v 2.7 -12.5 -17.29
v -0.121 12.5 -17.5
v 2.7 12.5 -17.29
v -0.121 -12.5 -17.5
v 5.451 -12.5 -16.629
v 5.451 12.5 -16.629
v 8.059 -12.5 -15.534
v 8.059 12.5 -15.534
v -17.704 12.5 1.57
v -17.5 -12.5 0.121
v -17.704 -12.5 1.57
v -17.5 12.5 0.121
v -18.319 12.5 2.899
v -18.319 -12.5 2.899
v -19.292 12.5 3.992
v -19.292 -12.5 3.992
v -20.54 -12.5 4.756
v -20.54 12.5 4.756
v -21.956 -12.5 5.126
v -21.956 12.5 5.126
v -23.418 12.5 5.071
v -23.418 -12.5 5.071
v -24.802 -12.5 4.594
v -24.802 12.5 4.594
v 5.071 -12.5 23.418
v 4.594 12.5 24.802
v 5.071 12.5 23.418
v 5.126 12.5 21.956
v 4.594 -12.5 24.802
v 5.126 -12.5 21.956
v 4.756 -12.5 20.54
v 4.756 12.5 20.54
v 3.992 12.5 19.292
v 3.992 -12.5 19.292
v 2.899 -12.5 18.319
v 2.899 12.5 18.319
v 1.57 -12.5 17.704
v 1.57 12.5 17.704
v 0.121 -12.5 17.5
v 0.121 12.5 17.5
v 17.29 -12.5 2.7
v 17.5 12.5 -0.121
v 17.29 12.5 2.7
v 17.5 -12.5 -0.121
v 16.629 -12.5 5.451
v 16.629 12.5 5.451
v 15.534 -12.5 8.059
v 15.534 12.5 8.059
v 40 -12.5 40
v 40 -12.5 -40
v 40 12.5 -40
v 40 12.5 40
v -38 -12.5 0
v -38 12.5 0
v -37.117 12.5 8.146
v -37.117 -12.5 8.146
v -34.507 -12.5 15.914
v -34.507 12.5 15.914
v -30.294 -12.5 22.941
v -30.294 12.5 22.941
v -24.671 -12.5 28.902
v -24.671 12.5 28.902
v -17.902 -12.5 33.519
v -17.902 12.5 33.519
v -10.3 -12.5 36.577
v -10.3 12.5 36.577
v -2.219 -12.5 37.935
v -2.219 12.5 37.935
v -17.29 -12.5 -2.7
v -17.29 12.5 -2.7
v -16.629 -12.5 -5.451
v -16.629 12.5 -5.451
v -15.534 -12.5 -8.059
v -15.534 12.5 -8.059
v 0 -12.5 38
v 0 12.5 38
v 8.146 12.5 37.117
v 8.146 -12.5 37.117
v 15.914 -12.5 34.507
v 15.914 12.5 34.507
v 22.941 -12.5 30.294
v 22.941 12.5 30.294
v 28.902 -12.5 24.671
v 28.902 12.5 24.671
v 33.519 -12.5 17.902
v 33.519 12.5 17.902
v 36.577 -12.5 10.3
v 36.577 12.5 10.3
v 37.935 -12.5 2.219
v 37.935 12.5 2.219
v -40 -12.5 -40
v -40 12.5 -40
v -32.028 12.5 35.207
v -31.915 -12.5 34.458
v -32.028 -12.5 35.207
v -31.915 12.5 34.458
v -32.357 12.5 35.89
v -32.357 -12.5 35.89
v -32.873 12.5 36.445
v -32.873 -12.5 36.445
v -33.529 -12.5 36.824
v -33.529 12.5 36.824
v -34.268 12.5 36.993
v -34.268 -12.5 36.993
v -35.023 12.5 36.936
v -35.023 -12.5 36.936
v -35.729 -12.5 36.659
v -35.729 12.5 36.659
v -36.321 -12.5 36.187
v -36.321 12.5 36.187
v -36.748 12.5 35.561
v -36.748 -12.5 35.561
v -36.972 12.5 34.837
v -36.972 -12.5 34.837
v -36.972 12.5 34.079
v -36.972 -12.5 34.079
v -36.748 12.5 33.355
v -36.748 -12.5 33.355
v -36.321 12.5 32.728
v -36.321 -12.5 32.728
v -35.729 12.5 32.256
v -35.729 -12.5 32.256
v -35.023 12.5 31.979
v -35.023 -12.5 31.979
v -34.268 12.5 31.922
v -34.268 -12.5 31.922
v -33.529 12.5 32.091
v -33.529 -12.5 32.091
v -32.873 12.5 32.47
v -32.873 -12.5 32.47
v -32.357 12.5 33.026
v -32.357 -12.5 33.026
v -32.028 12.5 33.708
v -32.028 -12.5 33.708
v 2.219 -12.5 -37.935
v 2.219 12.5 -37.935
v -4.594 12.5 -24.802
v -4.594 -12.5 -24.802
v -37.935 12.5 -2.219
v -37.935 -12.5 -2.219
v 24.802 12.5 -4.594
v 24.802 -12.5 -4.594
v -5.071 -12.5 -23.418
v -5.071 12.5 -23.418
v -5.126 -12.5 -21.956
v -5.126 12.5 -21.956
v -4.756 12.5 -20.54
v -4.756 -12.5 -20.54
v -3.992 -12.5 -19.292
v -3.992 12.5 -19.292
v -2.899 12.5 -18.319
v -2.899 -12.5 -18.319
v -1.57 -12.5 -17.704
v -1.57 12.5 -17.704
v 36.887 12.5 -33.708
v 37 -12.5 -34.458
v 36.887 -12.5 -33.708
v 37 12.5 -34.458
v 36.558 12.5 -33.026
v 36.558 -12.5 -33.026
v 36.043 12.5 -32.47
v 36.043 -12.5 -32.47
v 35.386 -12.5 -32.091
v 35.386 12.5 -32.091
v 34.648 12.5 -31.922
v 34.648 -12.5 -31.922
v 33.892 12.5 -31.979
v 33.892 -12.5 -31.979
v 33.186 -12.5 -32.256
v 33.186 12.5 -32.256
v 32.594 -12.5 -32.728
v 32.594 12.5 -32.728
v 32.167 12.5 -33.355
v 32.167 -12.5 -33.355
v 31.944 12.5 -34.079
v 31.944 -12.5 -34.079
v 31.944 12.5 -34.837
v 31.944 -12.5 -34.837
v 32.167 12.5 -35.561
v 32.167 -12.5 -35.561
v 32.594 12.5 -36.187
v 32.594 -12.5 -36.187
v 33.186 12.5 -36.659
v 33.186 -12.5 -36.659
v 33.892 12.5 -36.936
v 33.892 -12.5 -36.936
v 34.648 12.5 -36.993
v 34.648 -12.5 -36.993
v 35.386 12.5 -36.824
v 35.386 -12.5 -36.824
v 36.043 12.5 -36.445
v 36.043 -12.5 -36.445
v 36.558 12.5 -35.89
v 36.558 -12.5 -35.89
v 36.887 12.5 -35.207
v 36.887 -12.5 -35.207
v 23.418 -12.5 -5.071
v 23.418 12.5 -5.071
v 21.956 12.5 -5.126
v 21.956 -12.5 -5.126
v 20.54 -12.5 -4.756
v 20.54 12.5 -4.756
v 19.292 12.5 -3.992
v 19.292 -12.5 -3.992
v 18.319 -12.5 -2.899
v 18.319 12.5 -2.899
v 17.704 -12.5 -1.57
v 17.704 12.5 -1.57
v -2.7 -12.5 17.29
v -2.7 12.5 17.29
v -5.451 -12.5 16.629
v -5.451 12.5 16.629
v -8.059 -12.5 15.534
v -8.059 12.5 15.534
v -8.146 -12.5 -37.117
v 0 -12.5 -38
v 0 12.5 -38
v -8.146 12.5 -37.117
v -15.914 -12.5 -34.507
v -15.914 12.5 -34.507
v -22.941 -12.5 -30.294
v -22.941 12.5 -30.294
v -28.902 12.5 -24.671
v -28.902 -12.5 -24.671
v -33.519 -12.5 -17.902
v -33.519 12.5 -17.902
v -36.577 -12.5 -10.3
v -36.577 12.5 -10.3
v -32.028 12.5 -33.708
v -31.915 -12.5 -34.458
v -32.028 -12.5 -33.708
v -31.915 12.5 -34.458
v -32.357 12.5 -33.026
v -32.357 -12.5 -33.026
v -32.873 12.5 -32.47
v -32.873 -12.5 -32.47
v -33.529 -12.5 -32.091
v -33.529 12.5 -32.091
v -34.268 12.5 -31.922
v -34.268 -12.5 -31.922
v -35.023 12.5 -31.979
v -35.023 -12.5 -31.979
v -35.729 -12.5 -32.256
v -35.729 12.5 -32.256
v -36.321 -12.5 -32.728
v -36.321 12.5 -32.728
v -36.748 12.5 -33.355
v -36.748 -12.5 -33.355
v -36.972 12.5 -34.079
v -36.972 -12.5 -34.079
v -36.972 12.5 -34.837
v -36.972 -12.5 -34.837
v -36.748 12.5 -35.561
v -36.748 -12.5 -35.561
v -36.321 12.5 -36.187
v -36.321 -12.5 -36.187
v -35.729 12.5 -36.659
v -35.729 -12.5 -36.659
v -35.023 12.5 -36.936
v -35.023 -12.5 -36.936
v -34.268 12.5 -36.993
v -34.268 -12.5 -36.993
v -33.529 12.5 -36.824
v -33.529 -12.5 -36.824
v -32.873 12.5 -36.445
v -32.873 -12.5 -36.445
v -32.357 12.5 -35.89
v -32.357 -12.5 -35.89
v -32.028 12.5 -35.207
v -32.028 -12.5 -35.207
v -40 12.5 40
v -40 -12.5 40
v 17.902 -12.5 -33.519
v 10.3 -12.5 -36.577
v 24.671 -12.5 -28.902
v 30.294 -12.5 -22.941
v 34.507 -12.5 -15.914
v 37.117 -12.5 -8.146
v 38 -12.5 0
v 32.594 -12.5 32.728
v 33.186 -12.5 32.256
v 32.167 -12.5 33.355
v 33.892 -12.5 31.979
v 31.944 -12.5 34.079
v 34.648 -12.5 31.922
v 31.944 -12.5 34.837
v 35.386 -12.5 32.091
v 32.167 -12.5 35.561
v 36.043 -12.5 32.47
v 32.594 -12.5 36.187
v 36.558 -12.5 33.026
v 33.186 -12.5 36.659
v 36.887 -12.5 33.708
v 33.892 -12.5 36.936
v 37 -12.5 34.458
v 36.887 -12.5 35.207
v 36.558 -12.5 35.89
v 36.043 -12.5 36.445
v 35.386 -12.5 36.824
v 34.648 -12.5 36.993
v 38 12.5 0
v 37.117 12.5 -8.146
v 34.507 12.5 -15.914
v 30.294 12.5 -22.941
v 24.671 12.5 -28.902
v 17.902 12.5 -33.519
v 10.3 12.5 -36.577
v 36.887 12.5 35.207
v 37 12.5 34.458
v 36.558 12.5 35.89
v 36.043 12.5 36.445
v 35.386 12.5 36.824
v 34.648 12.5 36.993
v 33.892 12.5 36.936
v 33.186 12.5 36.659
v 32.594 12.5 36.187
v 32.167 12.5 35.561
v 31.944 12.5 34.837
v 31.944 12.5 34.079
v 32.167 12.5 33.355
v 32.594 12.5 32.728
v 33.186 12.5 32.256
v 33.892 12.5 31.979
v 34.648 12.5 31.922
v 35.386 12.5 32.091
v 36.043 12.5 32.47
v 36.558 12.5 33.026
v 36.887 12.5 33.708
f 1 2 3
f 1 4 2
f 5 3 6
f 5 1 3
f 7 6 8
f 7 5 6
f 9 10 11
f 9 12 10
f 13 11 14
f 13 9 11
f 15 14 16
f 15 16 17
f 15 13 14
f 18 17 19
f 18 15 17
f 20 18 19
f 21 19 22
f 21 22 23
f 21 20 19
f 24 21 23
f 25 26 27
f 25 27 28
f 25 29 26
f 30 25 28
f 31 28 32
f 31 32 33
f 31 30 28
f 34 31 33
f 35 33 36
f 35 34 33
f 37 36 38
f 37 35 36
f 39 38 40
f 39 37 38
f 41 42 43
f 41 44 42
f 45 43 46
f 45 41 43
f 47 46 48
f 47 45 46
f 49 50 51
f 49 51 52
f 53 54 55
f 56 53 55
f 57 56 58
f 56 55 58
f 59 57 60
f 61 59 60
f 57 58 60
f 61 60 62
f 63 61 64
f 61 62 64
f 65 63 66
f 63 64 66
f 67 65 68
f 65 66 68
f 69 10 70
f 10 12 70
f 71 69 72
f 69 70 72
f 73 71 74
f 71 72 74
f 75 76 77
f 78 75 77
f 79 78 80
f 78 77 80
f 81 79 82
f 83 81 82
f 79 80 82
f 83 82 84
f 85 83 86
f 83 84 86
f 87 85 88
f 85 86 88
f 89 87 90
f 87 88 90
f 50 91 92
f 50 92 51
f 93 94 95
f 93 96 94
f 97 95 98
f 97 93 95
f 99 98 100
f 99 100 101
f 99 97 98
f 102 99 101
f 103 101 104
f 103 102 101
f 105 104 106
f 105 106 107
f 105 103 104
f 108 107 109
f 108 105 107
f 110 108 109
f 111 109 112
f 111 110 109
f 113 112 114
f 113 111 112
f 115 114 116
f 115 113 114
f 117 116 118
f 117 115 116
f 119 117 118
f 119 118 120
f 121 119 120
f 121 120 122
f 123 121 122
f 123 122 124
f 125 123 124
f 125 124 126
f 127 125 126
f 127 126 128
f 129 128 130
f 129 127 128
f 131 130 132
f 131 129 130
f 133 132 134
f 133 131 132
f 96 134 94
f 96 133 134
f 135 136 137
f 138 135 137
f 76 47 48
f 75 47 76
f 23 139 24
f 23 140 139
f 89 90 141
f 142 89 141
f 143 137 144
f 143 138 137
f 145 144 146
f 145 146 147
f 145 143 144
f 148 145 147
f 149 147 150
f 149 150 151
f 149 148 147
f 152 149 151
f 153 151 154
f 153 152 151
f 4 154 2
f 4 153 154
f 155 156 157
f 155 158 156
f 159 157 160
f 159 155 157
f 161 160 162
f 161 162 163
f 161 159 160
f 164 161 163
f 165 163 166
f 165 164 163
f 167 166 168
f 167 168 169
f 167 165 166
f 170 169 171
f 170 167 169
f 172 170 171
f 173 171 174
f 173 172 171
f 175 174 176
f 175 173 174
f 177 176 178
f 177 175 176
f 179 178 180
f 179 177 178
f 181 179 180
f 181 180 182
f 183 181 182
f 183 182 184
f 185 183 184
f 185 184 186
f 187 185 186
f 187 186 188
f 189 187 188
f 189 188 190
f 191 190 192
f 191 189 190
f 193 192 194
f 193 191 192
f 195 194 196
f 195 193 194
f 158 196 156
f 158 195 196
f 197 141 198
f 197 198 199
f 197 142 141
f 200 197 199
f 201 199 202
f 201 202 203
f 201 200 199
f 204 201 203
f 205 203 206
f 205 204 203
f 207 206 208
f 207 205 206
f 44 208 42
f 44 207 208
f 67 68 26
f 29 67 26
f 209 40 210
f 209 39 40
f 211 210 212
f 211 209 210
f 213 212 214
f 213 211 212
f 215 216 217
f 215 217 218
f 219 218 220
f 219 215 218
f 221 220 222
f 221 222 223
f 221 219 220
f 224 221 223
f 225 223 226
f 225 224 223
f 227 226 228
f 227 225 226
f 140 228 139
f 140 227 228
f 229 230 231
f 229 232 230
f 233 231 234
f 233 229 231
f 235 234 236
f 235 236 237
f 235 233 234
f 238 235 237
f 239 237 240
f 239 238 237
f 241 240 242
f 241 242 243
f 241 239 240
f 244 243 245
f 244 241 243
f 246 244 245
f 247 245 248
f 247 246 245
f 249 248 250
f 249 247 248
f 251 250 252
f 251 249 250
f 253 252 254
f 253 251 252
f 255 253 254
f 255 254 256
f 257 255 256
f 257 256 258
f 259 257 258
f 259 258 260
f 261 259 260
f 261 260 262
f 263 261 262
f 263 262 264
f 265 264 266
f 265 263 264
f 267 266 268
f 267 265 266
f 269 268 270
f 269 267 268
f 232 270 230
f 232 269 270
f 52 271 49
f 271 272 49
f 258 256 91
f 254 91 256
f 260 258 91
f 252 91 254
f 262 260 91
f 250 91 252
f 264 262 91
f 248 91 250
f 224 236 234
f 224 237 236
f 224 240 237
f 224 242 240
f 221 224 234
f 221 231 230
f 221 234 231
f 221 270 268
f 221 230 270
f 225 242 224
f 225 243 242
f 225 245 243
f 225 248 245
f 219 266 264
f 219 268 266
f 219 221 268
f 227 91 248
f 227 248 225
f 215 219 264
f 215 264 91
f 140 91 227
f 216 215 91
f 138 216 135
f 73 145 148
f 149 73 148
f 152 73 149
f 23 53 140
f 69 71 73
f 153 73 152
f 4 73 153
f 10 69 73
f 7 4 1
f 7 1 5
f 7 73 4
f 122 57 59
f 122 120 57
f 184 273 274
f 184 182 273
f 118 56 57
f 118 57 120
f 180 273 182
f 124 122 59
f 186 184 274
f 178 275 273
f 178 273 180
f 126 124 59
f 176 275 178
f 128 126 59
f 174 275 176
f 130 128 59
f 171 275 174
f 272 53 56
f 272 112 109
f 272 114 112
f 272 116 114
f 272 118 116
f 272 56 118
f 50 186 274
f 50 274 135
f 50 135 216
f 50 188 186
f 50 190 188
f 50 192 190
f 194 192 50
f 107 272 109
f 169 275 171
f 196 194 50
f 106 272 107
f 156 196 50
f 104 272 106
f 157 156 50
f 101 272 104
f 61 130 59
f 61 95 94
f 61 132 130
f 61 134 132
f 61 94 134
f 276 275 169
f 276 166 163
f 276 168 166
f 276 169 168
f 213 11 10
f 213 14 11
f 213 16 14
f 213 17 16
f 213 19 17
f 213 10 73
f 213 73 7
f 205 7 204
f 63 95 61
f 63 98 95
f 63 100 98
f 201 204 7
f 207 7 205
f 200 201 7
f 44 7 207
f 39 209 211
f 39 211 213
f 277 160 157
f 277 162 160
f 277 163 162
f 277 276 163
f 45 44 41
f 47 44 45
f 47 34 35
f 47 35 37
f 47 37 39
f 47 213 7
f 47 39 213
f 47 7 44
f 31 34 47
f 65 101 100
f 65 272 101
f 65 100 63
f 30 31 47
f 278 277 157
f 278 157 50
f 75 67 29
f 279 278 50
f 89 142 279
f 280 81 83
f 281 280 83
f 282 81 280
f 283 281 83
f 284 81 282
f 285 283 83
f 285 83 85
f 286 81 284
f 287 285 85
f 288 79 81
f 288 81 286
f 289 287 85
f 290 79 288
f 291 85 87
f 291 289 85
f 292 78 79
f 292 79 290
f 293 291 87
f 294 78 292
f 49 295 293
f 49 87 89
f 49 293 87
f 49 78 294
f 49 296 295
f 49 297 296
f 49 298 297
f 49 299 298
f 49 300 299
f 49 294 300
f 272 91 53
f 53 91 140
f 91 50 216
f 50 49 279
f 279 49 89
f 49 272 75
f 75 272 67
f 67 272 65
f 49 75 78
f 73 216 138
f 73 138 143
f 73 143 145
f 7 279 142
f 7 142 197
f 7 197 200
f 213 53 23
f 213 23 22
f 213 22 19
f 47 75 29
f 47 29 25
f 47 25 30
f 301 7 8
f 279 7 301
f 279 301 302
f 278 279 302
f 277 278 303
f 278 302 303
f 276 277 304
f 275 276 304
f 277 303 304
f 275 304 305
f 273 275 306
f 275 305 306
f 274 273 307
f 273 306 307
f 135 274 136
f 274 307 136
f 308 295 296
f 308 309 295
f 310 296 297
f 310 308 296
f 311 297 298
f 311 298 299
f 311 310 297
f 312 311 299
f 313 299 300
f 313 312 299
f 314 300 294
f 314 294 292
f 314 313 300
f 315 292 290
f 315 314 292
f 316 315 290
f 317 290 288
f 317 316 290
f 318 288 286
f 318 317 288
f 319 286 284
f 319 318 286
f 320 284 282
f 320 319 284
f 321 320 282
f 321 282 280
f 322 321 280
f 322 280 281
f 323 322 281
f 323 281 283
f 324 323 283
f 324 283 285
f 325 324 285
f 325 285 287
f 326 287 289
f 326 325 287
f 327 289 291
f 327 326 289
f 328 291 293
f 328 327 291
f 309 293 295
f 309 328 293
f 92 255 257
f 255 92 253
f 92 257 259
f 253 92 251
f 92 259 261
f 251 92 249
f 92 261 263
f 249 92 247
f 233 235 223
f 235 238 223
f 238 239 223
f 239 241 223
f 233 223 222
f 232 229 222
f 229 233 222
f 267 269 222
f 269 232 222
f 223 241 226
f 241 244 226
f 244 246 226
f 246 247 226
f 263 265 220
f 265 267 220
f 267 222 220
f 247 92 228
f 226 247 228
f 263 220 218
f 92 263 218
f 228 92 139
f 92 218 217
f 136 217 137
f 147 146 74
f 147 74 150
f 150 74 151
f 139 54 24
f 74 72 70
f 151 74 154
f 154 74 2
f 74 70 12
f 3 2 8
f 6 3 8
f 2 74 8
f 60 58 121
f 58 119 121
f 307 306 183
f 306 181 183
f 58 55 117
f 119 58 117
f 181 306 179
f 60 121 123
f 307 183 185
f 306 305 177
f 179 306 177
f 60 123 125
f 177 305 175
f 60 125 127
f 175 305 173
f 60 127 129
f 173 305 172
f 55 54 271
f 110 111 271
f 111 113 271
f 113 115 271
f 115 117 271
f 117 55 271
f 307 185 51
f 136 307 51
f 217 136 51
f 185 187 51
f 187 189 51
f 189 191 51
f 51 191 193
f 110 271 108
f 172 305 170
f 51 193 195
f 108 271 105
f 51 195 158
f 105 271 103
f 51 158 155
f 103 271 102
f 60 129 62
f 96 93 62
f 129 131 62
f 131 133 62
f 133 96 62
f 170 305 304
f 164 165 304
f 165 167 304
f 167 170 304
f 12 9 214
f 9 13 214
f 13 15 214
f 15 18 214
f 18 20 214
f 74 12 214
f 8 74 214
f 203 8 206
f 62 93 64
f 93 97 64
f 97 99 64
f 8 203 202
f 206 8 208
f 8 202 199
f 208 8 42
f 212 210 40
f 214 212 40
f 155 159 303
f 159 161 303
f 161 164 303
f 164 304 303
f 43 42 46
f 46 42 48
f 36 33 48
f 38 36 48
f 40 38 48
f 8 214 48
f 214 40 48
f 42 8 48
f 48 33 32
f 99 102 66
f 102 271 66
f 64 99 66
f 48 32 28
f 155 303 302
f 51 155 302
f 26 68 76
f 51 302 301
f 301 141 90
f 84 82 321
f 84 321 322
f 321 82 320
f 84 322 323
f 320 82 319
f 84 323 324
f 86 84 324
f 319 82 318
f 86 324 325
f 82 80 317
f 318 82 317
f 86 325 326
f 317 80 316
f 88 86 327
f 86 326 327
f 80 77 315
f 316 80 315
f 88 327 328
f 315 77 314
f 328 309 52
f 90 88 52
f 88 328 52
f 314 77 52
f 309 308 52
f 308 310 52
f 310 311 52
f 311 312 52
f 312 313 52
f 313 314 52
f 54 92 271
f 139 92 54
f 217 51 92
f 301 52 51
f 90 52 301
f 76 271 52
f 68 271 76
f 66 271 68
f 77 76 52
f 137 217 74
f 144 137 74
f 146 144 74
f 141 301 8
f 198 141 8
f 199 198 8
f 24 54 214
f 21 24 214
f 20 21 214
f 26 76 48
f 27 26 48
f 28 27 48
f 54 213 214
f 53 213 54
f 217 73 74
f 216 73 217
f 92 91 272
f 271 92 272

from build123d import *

# Parameters (mm, degrees)
F0_W     = 80
F0_H     = 80
F0_R     = 2.5423391552
F1_DEPTH = 12.5
F2_R     = 5


with BuildPart() as f1:
    # F0 (on Front) → F1 (new body, symmetric)
    with BuildSketch(Plane.XZ):
        Rectangle(F0_W, F0_H)
        with Locations((-34.4576608448, -34.4576608448)):
            Circle(F0_R, mode=Mode.SUBTRACT)
        with BuildLine():
            Line((-37.9351268711, -2.219493022), (-14.3494285056, 10.01718032))
            ThreePointArc((-14.3494285056, 10.01718032), (-17.4625571186, 1.1441585906), (-15.5338058985, -8.0592105263))
            Line((-15.5338058985, -8.0592105263), (0, -38))
            ThreePointArc((0, -38), (-26.0735427701, -27.6436315888), (-37.9351268711, -2.219493022))
        make_face(mode=Mode.SUBTRACT)
        with Locations((34.4576608448, -34.4576608448)):
            Circle(F0_R, mode=Mode.SUBTRACT)
        with BuildLine():
            Line((8.0592105263, -15.5338058985), (38, 0))
            ThreePointArc((38, 0), (27.6436315888, -26.0735427701), (2.219493022, -37.9351268711))
            Line((2.219493022, -37.9351268711), (-10.01718032, -14.3494285056))
            ThreePointArc((-10.01718032, -14.3494285056), (-1.1441585906, -17.4625571186), (8.0592105263, -15.5338058985))
        make_face(mode=Mode.SUBTRACT)
        with BuildLine():
            Line((-8.0592105263, 15.5338058985), (-38, 0))
            ThreePointArc((-38, 0), (-27.6436315888, 26.0735427701), (-2.219493022, 37.9351268711))
            Line((-2.219493022, 37.9351268711), (10.01718032, 14.3494285056))
            ThreePointArc((10.01718032, 14.3494285056), (1.1441585906, 17.4625571186), (-8.0592105263, 15.5338058985))
        make_face(mode=Mode.SUBTRACT)
        with Locations((-34.4576608448, 34.4576608448)):
            Circle(F0_R, mode=Mode.SUBTRACT)
        with BuildLine():
            Line((15.5338058985, 8.0592105263), (0, 38))
            ThreePointArc((0, 38), (26.0735427701, 27.6436315888), (37.9351268711, 2.219493022))
            Line((37.9351268711, 2.219493022), (14.3494285056, -10.01718032))
            ThreePointArc((14.3494285056, -10.01718032), (17.4625571186, -1.1441585906), (15.5338058985, 8.0592105263))
        make_face(mode=Mode.SUBTRACT)
        with Locations((34.4576608448, 34.4576608448)):
            Circle(F0_R, mode=Mode.SUBTRACT)
    extrude(amount=F1_DEPTH, both=True)

    # F2
    f2_edges = [f1.edges().sort_by_distance(p)[0] for p in [
        (10.01718, 0, 14.349429),
        (-14.349429, 0, 10.01718),
        (-10.01718, 0, -14.349429),
        (14.349429, 0, -10.01718),
    ]]
    fillet(f2_edges, radius=F2_R)


solid = f1.part
